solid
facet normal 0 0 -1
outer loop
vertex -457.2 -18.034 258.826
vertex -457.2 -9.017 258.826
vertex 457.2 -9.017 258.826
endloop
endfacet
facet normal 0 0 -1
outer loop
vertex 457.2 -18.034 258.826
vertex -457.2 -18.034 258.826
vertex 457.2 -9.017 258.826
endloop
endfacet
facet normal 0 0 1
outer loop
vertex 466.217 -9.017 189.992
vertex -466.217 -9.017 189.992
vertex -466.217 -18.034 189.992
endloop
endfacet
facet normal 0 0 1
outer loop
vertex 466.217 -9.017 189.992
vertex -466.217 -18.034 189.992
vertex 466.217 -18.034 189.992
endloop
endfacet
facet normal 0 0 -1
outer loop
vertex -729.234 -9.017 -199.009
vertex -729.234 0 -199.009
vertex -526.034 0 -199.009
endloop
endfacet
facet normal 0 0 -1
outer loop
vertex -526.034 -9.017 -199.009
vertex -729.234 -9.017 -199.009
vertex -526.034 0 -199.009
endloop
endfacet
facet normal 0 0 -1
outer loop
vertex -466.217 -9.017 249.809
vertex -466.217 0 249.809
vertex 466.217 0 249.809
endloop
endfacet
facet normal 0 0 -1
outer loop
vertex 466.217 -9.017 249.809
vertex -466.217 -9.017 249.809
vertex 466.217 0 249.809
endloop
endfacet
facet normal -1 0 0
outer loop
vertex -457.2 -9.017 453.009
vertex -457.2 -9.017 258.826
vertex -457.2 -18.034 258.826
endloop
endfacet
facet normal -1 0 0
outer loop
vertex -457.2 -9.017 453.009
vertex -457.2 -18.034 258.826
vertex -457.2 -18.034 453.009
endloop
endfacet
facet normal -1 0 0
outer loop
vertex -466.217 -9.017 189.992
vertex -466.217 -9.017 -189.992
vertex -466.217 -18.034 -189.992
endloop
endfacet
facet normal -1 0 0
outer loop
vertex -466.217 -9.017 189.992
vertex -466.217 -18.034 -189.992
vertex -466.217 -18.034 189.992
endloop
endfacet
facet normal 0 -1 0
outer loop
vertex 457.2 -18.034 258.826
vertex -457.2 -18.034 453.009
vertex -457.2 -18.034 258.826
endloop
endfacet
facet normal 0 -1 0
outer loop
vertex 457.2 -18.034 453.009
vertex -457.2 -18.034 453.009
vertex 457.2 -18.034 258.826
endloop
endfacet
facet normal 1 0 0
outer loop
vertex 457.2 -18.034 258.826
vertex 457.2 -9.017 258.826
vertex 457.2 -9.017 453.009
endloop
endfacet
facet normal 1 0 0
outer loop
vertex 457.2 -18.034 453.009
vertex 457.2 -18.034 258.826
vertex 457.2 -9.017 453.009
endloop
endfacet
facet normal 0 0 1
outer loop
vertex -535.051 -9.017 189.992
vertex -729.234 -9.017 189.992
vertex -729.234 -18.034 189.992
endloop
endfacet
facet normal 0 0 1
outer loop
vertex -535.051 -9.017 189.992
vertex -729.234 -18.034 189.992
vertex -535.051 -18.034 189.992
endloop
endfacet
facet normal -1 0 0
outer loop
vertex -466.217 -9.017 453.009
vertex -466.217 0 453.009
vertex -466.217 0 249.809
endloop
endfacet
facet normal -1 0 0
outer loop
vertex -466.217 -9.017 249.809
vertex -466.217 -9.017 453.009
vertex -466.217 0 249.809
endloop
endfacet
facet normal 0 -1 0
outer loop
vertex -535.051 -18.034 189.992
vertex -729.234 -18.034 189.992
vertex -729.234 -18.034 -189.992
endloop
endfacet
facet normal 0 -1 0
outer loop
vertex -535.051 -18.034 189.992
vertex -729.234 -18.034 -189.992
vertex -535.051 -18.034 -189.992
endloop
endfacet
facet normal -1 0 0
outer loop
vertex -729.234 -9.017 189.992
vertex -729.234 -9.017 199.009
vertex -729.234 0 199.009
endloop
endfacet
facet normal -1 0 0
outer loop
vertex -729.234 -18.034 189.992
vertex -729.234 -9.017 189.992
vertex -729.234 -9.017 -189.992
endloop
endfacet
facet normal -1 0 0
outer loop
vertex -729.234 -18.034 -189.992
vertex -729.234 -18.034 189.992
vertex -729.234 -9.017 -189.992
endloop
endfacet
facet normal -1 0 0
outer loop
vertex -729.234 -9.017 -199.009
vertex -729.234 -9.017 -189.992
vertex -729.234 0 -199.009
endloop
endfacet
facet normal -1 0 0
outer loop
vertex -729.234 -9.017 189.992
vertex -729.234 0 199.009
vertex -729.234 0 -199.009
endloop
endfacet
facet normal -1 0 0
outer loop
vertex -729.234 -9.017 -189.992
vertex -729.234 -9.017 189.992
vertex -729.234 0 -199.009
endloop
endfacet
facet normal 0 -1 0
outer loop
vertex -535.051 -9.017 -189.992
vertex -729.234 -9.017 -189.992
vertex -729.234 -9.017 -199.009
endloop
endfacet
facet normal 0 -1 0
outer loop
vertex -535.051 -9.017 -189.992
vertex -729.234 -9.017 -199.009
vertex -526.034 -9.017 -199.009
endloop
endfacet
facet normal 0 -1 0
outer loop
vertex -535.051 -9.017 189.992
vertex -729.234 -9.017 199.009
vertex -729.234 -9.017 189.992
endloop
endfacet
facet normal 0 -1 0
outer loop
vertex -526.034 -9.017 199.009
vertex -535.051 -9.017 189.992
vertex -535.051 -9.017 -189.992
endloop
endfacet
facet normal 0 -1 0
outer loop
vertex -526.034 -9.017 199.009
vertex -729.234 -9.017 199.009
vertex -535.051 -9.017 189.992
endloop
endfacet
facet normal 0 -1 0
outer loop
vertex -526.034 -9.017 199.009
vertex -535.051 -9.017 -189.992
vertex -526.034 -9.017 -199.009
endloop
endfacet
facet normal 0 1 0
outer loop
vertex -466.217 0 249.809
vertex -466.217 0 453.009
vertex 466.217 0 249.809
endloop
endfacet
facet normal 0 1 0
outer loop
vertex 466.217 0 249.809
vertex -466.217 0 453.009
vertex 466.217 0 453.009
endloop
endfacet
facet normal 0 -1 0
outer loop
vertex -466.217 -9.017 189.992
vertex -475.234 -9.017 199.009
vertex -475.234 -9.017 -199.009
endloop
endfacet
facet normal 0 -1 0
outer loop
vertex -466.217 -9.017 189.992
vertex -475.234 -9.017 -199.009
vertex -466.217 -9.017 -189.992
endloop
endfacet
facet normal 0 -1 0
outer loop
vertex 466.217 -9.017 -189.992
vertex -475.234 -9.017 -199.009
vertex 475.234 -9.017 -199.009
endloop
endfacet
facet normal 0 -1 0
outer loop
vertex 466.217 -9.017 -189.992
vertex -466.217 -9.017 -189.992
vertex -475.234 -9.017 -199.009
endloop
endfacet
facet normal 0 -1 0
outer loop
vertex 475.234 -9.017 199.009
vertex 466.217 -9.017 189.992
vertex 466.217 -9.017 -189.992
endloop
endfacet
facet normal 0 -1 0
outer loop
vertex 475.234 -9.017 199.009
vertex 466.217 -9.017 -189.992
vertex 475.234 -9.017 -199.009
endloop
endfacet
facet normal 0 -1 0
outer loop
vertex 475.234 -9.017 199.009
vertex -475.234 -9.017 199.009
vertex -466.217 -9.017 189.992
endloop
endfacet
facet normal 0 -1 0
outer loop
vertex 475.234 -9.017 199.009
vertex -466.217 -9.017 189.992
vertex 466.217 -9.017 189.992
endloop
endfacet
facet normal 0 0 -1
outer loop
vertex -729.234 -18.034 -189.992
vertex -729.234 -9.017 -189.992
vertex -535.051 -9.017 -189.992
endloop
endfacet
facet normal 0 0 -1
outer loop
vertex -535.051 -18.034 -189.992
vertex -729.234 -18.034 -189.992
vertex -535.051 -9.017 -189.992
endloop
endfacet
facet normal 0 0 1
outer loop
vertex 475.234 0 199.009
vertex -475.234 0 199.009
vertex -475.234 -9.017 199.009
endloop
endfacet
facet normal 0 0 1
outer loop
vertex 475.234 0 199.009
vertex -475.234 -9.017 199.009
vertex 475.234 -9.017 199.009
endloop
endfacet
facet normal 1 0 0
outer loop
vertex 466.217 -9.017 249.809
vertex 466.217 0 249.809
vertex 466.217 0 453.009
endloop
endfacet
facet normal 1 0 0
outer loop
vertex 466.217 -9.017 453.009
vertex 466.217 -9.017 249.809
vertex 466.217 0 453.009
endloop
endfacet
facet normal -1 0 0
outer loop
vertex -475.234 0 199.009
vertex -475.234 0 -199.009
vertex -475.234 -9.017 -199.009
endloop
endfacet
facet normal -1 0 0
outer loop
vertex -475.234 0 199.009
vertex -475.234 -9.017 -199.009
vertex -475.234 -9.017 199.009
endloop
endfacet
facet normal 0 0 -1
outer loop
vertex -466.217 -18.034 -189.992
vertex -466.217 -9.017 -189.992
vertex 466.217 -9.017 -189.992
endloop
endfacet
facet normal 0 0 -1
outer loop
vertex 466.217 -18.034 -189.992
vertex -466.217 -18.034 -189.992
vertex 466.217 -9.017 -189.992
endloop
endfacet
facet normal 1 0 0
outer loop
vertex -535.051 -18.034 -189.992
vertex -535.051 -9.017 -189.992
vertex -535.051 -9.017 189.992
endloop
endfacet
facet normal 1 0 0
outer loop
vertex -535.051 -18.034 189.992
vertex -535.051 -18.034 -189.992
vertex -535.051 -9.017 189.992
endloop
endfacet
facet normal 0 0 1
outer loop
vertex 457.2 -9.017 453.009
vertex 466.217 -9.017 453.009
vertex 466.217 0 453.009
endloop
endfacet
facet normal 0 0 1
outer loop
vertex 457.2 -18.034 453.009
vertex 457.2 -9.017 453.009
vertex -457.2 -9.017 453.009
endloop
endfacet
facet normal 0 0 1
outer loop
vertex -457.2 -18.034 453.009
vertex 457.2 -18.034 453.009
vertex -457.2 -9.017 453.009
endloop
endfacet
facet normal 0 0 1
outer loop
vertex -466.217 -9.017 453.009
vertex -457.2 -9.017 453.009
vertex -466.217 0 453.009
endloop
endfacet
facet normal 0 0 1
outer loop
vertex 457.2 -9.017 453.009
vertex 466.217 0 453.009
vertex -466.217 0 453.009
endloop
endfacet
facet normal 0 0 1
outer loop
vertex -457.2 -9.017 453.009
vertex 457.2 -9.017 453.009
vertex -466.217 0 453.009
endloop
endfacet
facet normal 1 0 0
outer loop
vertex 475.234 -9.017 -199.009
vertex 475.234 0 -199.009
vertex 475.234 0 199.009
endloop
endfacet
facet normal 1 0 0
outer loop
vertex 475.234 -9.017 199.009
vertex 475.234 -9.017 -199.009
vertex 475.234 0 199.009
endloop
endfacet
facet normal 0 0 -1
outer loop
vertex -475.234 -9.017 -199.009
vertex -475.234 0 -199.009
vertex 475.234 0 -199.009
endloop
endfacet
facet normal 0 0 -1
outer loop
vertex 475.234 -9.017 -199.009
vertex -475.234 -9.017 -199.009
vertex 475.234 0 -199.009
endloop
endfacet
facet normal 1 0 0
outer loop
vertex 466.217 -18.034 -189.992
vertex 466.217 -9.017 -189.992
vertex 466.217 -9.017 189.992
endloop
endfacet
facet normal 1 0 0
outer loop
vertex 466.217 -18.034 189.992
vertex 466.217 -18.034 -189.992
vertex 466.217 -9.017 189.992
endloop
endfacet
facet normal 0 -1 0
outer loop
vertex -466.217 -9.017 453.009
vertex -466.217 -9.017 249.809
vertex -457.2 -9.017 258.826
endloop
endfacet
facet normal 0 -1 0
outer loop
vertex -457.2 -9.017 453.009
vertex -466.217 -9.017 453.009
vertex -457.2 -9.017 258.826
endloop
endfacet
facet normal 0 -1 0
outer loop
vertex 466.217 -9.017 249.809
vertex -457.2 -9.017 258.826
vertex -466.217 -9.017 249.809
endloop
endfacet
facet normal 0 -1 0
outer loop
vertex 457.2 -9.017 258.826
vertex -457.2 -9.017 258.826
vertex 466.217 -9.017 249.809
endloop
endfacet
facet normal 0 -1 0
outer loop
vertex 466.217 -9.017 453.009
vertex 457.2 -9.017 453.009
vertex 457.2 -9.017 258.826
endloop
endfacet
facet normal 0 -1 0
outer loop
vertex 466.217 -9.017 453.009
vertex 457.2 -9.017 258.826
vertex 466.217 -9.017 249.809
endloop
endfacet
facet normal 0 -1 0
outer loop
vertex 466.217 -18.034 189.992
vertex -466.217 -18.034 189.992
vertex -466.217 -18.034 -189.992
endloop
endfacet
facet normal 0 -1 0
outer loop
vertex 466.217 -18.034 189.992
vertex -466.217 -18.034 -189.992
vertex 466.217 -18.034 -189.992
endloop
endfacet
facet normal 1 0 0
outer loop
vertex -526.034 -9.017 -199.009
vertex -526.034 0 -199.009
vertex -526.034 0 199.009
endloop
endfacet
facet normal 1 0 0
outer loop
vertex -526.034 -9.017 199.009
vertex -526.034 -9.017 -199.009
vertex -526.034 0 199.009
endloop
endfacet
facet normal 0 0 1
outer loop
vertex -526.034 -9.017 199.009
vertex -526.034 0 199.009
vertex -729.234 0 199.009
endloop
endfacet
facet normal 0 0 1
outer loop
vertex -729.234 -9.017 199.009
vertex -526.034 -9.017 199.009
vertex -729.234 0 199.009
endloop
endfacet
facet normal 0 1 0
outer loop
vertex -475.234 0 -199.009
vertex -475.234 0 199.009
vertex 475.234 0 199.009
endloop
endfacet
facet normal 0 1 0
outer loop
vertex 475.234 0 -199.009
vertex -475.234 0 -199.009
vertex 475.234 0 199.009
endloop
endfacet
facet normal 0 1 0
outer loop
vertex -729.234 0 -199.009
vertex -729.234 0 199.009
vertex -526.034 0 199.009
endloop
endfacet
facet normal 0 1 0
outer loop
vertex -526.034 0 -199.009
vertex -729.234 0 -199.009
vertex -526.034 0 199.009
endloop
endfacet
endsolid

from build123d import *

# Parameters (mm, degrees)
F1_W     = 914.4
F1_H     = 194.183
F2_DEPTH = 18.034
F1_W_2   = 932.434
F1_H_2   = 379.984
F1_W_3   = 194.183
F1_H_3   = 9.017
F3_DEPTH = 9.017
F1_W_4   = 950.468
F1_H_4   = 398.018
F1_W_5   = 9.017


# Not quite as in the source:
# - a variable given as a bare number and used for a length is read in inches; the dataset says mm whatever the document's units were


with BuildPart() as f2:
    # F1 (on Front) → F2 (new body)
    with BuildSketch(Plane.XZ):
        with Locations((0, 355.9175)):
            Rectangle(F1_W, F1_H)
    extrude(amount=F2_DEPTH)

    # F1 (on Front) → F3 (join)
    with BuildSketch(Plane.XZ):
        Polygon((-466.217, 249.809), (-457.2, 249.809), (-457.2, 258.826), (-457.2, 453.009), (-466.217, 453.009), align=None)
        Polygon((457.2, 249.809), (466.217, 249.809), (466.217, 453.009), (457.2, 453.009), (457.2, 258.826), align=None)
        with Locations((0, 254.3175)):
            Rectangle(F1_W, F1_H_3)
    extrude(amount=F3_DEPTH)


with BuildPart() as f2b:
    # F1 (on Front) → F2, piece 2 (new body)
    with BuildSketch(Plane.XZ):
        Rectangle(F1_W_2, F1_H_2)
    extrude(amount=F2_DEPTH)

    # F1 (on Front) → F3, piece 2 (join)
    with BuildSketch(Plane.XZ):
        Rectangle(F1_W_4, F1_H_4)
        Rectangle(F1_W_2, F1_H_2, mode=Mode.SUBTRACT)
    extrude(amount=F3_DEPTH)


with BuildPart() as f2c:
    # F1 (on Front) → F2, piece 3 (new body)
    with BuildSketch(Plane.XZ):
        with Locations((-632.1425, 0)):
            Rectangle(F1_W_3, F1_H_2)
    extrude(amount=F2_DEPTH)

    # F1 (on Front) → F3, piece 3 (join)
    with BuildSketch(Plane.XZ):
        Polygon((-526.034, 189.992), (-526.034, 199.009), (-729.234, 199.009), (-729.234, 189.992), (-535.051, 189.992), align=None)
        with Locations((-530.5425, 0)):
            Rectangle(F1_W_5, F1_H_2)
        Polygon((-526.034, -199.009), (-526.034, -189.992), (-535.051, -189.992), (-729.234, -189.992), (-729.234, -199.009), align=None)
    extrude(amount=F3_DEPTH)


solid = Compound([f2.part, f2b.part, f2c.part])
